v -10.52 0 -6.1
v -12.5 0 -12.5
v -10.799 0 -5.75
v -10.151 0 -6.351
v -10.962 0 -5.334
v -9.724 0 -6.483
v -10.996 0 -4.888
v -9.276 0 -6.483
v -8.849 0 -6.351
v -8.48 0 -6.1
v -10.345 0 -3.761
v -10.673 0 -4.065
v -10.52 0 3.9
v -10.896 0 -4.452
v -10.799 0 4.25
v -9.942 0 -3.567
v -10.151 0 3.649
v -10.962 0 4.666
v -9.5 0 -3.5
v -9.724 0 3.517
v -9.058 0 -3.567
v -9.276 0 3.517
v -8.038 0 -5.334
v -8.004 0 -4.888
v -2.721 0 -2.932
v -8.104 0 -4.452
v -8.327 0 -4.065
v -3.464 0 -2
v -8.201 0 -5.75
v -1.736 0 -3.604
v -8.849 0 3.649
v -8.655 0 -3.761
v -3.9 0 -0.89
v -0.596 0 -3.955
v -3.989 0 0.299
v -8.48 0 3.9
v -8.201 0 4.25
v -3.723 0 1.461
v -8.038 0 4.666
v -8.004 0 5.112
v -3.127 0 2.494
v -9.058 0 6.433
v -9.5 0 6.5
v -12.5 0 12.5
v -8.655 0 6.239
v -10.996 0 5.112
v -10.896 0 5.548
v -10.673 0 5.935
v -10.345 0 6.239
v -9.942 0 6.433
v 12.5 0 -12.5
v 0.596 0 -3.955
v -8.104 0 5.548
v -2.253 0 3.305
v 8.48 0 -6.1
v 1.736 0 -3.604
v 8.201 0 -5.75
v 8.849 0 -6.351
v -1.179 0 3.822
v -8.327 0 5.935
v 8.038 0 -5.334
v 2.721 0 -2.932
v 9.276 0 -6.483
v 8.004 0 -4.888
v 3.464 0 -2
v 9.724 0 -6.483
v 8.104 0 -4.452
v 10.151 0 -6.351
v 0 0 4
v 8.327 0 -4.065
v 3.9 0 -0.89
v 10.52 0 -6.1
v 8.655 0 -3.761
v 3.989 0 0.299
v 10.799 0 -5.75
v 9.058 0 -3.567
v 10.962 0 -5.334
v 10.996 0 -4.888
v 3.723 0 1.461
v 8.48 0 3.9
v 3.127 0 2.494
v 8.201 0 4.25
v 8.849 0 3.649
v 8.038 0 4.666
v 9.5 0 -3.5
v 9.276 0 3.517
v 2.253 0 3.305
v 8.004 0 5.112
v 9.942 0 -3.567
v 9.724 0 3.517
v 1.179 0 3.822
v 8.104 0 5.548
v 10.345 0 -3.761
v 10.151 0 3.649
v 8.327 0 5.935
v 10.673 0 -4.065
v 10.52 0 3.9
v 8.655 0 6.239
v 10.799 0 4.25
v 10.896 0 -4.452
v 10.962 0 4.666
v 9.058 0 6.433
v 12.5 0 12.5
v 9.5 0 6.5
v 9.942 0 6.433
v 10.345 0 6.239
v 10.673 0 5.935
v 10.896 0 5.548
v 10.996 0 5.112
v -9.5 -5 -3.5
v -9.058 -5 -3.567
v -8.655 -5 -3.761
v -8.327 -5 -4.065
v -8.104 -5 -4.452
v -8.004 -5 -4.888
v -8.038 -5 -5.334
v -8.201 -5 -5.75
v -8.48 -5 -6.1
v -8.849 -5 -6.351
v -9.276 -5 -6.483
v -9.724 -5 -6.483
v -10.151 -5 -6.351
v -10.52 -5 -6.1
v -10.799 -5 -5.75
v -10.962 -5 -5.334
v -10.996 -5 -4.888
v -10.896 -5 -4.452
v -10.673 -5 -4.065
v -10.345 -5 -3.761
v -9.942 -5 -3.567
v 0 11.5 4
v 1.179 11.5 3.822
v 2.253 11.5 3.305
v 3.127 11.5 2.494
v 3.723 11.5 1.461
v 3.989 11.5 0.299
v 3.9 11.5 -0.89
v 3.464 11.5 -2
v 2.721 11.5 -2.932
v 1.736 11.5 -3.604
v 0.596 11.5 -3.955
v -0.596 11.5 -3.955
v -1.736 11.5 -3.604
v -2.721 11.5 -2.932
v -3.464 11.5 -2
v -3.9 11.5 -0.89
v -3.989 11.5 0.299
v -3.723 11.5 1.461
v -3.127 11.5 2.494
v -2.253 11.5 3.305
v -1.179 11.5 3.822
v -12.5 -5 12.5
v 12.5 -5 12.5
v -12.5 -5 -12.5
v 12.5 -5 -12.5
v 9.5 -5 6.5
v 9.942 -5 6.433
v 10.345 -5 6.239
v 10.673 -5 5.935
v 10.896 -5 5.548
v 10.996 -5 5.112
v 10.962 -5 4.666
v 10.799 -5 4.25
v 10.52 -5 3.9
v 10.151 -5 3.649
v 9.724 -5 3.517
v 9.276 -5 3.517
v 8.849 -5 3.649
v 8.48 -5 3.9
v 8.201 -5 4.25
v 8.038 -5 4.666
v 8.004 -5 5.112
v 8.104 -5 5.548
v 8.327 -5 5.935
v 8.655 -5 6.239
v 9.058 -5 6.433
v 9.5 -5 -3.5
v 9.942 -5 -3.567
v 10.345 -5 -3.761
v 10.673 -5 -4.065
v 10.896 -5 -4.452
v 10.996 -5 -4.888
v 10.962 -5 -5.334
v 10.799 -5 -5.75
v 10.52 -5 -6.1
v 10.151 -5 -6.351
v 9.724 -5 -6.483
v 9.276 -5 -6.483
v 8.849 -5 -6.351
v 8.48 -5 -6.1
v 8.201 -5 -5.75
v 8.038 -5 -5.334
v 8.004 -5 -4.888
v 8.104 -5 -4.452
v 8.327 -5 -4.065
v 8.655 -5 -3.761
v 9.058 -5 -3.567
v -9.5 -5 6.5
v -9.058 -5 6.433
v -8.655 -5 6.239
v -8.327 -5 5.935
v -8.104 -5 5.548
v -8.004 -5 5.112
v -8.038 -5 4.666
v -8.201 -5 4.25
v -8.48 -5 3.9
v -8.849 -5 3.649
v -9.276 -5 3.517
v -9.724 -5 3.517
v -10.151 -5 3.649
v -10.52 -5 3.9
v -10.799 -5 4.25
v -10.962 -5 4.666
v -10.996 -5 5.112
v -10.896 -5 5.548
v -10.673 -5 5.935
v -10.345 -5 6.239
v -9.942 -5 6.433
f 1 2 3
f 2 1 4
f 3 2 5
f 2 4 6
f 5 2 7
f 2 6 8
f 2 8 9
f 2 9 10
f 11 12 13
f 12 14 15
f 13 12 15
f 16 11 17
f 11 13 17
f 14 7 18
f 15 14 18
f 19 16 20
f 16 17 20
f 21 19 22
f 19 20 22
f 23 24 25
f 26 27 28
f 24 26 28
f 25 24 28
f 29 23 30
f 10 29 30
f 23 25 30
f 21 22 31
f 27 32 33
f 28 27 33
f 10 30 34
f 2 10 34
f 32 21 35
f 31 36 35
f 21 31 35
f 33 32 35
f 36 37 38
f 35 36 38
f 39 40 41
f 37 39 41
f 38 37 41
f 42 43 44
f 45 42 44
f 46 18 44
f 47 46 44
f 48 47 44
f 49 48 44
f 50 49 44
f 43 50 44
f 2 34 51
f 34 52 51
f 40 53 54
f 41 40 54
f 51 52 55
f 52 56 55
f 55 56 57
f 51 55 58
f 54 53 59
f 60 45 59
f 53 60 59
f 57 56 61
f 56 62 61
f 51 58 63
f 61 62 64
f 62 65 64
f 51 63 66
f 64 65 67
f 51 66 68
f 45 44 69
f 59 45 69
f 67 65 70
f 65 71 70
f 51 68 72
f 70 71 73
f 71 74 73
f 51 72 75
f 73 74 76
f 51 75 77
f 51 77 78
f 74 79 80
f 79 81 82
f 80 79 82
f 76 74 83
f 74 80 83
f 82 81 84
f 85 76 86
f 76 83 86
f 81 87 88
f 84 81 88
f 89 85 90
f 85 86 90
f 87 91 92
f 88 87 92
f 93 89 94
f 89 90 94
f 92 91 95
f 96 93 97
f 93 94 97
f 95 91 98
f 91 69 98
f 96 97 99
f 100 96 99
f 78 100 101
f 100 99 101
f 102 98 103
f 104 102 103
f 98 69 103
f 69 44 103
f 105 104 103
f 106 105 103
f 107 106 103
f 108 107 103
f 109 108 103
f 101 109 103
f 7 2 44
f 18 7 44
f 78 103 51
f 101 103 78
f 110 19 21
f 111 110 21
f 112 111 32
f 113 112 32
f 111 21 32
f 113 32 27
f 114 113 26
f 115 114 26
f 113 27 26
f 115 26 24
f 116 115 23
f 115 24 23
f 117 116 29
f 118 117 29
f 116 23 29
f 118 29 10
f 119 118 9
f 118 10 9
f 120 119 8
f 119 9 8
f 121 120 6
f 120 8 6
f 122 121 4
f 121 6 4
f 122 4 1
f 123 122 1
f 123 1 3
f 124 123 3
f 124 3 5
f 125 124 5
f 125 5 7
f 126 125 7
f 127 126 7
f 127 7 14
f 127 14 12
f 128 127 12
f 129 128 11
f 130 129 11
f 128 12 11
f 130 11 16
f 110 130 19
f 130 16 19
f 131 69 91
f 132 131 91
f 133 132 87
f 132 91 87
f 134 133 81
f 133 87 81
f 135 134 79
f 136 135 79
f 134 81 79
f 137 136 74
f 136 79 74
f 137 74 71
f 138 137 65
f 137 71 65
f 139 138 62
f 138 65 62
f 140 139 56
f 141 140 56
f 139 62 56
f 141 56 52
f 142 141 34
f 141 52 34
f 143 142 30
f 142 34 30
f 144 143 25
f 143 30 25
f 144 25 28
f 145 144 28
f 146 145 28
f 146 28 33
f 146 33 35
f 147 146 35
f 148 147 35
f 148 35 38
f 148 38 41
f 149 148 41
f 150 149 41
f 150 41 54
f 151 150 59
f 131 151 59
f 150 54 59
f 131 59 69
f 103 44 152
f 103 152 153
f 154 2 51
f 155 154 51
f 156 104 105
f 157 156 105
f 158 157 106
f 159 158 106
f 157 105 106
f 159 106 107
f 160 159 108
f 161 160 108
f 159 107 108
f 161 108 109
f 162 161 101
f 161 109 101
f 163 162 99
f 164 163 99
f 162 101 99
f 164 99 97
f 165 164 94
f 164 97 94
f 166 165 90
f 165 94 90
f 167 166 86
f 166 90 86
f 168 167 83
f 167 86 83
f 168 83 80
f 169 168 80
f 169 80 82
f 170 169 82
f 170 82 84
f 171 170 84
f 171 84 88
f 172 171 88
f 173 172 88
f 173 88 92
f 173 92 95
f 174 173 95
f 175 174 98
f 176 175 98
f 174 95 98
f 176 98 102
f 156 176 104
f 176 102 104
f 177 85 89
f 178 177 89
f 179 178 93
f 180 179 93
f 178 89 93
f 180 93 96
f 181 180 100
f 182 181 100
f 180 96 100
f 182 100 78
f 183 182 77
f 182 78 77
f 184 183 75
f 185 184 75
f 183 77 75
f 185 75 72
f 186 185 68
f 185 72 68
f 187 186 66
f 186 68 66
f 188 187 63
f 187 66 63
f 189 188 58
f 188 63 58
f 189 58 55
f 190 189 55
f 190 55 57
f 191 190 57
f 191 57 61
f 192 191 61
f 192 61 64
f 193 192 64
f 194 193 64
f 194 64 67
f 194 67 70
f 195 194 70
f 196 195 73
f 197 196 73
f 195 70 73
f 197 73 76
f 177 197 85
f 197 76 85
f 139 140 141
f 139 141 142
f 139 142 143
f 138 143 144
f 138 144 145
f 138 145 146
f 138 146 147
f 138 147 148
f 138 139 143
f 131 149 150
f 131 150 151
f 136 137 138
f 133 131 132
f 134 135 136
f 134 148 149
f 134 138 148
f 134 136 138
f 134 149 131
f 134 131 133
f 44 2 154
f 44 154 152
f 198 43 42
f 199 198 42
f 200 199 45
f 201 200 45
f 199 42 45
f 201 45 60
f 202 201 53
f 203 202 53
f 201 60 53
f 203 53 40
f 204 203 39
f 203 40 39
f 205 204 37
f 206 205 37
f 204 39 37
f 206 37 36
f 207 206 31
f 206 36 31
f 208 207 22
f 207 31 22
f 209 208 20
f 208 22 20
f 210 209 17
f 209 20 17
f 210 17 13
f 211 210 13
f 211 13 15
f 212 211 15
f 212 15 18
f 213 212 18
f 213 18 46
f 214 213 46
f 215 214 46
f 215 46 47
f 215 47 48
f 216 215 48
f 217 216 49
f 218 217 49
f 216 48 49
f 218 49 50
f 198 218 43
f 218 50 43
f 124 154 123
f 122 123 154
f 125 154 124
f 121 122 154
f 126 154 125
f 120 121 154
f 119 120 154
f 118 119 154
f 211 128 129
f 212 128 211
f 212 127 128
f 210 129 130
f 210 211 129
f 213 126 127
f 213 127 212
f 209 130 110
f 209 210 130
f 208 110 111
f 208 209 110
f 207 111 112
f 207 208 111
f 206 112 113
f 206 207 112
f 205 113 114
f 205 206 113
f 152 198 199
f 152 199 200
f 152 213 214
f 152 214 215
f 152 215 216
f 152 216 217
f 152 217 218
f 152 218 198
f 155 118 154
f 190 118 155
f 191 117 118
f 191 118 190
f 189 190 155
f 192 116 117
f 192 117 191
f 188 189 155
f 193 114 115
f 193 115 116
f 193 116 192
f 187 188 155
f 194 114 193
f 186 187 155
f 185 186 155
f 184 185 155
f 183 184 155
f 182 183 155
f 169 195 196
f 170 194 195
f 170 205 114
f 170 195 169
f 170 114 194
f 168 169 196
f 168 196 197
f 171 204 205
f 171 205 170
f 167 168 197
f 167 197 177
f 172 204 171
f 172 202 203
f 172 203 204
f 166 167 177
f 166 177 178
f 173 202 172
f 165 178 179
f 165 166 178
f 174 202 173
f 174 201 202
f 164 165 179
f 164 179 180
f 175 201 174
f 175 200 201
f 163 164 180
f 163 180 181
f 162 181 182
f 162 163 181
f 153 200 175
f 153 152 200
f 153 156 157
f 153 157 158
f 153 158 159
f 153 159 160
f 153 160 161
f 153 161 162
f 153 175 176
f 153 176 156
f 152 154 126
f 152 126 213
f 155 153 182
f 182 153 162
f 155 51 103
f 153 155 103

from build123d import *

# Parameters (mm, degrees)
SKETCH_1_R          = 4
EXTRUDE_1_DEPTH     = 11.5
SKETCH_3_W          = 25
SKETCH_3_H          = 25
EXTRUDE_2_DEPTH     = 5
SKETCH_4_R          = 1.5
CUT_EXTRUDE_2_DEPTH = 5


with BuildPart() as part:
    # 草图1 → 凸台-拉伸1 (new body)
    with BuildSketch(Plane(origin=(0, 0, 0), x_dir=(1, 0, 0), z_dir=(0, 1, 0))):
        with Locations(Location((0, 0, 0), (0, 0, 270))):
            Circle(SKETCH_1_R)
    extrude(amount=EXTRUDE_1_DEPTH)

    # 草图3 → 凸台-拉伸2 (add)
    with BuildSketch(Plane.XZ):
        Rectangle(SKETCH_3_W, SKETCH_3_H)
    extrude(amount=EXTRUDE_2_DEPTH)

    # 草图4 → 切除-拉伸2 (cut)
    with BuildSketch(Plane(origin=(0, 0, 0), x_dir=(1, 0, 0), z_dir=(0, 1, 0))):
        with Locations(Location((9.5, 5, 0), (0, 0, 270))):
            Circle(SKETCH_4_R)
        with Locations(Location((9.5, -5, 0), (0, 0, 270))):
            Circle(SKETCH_4_R)
        with Locations(Location((-9.5, -5, 0), (0, 0, 270))):
            Circle(SKETCH_4_R)
        with Locations(Location((-9.5, 5, 0), (0, 0, 270))):
            Circle(SKETCH_4_R)
    extrude(amount=-CUT_EXTRUDE_2_DEPTH, mode=Mode.SUBTRACT)


solid = part.part
